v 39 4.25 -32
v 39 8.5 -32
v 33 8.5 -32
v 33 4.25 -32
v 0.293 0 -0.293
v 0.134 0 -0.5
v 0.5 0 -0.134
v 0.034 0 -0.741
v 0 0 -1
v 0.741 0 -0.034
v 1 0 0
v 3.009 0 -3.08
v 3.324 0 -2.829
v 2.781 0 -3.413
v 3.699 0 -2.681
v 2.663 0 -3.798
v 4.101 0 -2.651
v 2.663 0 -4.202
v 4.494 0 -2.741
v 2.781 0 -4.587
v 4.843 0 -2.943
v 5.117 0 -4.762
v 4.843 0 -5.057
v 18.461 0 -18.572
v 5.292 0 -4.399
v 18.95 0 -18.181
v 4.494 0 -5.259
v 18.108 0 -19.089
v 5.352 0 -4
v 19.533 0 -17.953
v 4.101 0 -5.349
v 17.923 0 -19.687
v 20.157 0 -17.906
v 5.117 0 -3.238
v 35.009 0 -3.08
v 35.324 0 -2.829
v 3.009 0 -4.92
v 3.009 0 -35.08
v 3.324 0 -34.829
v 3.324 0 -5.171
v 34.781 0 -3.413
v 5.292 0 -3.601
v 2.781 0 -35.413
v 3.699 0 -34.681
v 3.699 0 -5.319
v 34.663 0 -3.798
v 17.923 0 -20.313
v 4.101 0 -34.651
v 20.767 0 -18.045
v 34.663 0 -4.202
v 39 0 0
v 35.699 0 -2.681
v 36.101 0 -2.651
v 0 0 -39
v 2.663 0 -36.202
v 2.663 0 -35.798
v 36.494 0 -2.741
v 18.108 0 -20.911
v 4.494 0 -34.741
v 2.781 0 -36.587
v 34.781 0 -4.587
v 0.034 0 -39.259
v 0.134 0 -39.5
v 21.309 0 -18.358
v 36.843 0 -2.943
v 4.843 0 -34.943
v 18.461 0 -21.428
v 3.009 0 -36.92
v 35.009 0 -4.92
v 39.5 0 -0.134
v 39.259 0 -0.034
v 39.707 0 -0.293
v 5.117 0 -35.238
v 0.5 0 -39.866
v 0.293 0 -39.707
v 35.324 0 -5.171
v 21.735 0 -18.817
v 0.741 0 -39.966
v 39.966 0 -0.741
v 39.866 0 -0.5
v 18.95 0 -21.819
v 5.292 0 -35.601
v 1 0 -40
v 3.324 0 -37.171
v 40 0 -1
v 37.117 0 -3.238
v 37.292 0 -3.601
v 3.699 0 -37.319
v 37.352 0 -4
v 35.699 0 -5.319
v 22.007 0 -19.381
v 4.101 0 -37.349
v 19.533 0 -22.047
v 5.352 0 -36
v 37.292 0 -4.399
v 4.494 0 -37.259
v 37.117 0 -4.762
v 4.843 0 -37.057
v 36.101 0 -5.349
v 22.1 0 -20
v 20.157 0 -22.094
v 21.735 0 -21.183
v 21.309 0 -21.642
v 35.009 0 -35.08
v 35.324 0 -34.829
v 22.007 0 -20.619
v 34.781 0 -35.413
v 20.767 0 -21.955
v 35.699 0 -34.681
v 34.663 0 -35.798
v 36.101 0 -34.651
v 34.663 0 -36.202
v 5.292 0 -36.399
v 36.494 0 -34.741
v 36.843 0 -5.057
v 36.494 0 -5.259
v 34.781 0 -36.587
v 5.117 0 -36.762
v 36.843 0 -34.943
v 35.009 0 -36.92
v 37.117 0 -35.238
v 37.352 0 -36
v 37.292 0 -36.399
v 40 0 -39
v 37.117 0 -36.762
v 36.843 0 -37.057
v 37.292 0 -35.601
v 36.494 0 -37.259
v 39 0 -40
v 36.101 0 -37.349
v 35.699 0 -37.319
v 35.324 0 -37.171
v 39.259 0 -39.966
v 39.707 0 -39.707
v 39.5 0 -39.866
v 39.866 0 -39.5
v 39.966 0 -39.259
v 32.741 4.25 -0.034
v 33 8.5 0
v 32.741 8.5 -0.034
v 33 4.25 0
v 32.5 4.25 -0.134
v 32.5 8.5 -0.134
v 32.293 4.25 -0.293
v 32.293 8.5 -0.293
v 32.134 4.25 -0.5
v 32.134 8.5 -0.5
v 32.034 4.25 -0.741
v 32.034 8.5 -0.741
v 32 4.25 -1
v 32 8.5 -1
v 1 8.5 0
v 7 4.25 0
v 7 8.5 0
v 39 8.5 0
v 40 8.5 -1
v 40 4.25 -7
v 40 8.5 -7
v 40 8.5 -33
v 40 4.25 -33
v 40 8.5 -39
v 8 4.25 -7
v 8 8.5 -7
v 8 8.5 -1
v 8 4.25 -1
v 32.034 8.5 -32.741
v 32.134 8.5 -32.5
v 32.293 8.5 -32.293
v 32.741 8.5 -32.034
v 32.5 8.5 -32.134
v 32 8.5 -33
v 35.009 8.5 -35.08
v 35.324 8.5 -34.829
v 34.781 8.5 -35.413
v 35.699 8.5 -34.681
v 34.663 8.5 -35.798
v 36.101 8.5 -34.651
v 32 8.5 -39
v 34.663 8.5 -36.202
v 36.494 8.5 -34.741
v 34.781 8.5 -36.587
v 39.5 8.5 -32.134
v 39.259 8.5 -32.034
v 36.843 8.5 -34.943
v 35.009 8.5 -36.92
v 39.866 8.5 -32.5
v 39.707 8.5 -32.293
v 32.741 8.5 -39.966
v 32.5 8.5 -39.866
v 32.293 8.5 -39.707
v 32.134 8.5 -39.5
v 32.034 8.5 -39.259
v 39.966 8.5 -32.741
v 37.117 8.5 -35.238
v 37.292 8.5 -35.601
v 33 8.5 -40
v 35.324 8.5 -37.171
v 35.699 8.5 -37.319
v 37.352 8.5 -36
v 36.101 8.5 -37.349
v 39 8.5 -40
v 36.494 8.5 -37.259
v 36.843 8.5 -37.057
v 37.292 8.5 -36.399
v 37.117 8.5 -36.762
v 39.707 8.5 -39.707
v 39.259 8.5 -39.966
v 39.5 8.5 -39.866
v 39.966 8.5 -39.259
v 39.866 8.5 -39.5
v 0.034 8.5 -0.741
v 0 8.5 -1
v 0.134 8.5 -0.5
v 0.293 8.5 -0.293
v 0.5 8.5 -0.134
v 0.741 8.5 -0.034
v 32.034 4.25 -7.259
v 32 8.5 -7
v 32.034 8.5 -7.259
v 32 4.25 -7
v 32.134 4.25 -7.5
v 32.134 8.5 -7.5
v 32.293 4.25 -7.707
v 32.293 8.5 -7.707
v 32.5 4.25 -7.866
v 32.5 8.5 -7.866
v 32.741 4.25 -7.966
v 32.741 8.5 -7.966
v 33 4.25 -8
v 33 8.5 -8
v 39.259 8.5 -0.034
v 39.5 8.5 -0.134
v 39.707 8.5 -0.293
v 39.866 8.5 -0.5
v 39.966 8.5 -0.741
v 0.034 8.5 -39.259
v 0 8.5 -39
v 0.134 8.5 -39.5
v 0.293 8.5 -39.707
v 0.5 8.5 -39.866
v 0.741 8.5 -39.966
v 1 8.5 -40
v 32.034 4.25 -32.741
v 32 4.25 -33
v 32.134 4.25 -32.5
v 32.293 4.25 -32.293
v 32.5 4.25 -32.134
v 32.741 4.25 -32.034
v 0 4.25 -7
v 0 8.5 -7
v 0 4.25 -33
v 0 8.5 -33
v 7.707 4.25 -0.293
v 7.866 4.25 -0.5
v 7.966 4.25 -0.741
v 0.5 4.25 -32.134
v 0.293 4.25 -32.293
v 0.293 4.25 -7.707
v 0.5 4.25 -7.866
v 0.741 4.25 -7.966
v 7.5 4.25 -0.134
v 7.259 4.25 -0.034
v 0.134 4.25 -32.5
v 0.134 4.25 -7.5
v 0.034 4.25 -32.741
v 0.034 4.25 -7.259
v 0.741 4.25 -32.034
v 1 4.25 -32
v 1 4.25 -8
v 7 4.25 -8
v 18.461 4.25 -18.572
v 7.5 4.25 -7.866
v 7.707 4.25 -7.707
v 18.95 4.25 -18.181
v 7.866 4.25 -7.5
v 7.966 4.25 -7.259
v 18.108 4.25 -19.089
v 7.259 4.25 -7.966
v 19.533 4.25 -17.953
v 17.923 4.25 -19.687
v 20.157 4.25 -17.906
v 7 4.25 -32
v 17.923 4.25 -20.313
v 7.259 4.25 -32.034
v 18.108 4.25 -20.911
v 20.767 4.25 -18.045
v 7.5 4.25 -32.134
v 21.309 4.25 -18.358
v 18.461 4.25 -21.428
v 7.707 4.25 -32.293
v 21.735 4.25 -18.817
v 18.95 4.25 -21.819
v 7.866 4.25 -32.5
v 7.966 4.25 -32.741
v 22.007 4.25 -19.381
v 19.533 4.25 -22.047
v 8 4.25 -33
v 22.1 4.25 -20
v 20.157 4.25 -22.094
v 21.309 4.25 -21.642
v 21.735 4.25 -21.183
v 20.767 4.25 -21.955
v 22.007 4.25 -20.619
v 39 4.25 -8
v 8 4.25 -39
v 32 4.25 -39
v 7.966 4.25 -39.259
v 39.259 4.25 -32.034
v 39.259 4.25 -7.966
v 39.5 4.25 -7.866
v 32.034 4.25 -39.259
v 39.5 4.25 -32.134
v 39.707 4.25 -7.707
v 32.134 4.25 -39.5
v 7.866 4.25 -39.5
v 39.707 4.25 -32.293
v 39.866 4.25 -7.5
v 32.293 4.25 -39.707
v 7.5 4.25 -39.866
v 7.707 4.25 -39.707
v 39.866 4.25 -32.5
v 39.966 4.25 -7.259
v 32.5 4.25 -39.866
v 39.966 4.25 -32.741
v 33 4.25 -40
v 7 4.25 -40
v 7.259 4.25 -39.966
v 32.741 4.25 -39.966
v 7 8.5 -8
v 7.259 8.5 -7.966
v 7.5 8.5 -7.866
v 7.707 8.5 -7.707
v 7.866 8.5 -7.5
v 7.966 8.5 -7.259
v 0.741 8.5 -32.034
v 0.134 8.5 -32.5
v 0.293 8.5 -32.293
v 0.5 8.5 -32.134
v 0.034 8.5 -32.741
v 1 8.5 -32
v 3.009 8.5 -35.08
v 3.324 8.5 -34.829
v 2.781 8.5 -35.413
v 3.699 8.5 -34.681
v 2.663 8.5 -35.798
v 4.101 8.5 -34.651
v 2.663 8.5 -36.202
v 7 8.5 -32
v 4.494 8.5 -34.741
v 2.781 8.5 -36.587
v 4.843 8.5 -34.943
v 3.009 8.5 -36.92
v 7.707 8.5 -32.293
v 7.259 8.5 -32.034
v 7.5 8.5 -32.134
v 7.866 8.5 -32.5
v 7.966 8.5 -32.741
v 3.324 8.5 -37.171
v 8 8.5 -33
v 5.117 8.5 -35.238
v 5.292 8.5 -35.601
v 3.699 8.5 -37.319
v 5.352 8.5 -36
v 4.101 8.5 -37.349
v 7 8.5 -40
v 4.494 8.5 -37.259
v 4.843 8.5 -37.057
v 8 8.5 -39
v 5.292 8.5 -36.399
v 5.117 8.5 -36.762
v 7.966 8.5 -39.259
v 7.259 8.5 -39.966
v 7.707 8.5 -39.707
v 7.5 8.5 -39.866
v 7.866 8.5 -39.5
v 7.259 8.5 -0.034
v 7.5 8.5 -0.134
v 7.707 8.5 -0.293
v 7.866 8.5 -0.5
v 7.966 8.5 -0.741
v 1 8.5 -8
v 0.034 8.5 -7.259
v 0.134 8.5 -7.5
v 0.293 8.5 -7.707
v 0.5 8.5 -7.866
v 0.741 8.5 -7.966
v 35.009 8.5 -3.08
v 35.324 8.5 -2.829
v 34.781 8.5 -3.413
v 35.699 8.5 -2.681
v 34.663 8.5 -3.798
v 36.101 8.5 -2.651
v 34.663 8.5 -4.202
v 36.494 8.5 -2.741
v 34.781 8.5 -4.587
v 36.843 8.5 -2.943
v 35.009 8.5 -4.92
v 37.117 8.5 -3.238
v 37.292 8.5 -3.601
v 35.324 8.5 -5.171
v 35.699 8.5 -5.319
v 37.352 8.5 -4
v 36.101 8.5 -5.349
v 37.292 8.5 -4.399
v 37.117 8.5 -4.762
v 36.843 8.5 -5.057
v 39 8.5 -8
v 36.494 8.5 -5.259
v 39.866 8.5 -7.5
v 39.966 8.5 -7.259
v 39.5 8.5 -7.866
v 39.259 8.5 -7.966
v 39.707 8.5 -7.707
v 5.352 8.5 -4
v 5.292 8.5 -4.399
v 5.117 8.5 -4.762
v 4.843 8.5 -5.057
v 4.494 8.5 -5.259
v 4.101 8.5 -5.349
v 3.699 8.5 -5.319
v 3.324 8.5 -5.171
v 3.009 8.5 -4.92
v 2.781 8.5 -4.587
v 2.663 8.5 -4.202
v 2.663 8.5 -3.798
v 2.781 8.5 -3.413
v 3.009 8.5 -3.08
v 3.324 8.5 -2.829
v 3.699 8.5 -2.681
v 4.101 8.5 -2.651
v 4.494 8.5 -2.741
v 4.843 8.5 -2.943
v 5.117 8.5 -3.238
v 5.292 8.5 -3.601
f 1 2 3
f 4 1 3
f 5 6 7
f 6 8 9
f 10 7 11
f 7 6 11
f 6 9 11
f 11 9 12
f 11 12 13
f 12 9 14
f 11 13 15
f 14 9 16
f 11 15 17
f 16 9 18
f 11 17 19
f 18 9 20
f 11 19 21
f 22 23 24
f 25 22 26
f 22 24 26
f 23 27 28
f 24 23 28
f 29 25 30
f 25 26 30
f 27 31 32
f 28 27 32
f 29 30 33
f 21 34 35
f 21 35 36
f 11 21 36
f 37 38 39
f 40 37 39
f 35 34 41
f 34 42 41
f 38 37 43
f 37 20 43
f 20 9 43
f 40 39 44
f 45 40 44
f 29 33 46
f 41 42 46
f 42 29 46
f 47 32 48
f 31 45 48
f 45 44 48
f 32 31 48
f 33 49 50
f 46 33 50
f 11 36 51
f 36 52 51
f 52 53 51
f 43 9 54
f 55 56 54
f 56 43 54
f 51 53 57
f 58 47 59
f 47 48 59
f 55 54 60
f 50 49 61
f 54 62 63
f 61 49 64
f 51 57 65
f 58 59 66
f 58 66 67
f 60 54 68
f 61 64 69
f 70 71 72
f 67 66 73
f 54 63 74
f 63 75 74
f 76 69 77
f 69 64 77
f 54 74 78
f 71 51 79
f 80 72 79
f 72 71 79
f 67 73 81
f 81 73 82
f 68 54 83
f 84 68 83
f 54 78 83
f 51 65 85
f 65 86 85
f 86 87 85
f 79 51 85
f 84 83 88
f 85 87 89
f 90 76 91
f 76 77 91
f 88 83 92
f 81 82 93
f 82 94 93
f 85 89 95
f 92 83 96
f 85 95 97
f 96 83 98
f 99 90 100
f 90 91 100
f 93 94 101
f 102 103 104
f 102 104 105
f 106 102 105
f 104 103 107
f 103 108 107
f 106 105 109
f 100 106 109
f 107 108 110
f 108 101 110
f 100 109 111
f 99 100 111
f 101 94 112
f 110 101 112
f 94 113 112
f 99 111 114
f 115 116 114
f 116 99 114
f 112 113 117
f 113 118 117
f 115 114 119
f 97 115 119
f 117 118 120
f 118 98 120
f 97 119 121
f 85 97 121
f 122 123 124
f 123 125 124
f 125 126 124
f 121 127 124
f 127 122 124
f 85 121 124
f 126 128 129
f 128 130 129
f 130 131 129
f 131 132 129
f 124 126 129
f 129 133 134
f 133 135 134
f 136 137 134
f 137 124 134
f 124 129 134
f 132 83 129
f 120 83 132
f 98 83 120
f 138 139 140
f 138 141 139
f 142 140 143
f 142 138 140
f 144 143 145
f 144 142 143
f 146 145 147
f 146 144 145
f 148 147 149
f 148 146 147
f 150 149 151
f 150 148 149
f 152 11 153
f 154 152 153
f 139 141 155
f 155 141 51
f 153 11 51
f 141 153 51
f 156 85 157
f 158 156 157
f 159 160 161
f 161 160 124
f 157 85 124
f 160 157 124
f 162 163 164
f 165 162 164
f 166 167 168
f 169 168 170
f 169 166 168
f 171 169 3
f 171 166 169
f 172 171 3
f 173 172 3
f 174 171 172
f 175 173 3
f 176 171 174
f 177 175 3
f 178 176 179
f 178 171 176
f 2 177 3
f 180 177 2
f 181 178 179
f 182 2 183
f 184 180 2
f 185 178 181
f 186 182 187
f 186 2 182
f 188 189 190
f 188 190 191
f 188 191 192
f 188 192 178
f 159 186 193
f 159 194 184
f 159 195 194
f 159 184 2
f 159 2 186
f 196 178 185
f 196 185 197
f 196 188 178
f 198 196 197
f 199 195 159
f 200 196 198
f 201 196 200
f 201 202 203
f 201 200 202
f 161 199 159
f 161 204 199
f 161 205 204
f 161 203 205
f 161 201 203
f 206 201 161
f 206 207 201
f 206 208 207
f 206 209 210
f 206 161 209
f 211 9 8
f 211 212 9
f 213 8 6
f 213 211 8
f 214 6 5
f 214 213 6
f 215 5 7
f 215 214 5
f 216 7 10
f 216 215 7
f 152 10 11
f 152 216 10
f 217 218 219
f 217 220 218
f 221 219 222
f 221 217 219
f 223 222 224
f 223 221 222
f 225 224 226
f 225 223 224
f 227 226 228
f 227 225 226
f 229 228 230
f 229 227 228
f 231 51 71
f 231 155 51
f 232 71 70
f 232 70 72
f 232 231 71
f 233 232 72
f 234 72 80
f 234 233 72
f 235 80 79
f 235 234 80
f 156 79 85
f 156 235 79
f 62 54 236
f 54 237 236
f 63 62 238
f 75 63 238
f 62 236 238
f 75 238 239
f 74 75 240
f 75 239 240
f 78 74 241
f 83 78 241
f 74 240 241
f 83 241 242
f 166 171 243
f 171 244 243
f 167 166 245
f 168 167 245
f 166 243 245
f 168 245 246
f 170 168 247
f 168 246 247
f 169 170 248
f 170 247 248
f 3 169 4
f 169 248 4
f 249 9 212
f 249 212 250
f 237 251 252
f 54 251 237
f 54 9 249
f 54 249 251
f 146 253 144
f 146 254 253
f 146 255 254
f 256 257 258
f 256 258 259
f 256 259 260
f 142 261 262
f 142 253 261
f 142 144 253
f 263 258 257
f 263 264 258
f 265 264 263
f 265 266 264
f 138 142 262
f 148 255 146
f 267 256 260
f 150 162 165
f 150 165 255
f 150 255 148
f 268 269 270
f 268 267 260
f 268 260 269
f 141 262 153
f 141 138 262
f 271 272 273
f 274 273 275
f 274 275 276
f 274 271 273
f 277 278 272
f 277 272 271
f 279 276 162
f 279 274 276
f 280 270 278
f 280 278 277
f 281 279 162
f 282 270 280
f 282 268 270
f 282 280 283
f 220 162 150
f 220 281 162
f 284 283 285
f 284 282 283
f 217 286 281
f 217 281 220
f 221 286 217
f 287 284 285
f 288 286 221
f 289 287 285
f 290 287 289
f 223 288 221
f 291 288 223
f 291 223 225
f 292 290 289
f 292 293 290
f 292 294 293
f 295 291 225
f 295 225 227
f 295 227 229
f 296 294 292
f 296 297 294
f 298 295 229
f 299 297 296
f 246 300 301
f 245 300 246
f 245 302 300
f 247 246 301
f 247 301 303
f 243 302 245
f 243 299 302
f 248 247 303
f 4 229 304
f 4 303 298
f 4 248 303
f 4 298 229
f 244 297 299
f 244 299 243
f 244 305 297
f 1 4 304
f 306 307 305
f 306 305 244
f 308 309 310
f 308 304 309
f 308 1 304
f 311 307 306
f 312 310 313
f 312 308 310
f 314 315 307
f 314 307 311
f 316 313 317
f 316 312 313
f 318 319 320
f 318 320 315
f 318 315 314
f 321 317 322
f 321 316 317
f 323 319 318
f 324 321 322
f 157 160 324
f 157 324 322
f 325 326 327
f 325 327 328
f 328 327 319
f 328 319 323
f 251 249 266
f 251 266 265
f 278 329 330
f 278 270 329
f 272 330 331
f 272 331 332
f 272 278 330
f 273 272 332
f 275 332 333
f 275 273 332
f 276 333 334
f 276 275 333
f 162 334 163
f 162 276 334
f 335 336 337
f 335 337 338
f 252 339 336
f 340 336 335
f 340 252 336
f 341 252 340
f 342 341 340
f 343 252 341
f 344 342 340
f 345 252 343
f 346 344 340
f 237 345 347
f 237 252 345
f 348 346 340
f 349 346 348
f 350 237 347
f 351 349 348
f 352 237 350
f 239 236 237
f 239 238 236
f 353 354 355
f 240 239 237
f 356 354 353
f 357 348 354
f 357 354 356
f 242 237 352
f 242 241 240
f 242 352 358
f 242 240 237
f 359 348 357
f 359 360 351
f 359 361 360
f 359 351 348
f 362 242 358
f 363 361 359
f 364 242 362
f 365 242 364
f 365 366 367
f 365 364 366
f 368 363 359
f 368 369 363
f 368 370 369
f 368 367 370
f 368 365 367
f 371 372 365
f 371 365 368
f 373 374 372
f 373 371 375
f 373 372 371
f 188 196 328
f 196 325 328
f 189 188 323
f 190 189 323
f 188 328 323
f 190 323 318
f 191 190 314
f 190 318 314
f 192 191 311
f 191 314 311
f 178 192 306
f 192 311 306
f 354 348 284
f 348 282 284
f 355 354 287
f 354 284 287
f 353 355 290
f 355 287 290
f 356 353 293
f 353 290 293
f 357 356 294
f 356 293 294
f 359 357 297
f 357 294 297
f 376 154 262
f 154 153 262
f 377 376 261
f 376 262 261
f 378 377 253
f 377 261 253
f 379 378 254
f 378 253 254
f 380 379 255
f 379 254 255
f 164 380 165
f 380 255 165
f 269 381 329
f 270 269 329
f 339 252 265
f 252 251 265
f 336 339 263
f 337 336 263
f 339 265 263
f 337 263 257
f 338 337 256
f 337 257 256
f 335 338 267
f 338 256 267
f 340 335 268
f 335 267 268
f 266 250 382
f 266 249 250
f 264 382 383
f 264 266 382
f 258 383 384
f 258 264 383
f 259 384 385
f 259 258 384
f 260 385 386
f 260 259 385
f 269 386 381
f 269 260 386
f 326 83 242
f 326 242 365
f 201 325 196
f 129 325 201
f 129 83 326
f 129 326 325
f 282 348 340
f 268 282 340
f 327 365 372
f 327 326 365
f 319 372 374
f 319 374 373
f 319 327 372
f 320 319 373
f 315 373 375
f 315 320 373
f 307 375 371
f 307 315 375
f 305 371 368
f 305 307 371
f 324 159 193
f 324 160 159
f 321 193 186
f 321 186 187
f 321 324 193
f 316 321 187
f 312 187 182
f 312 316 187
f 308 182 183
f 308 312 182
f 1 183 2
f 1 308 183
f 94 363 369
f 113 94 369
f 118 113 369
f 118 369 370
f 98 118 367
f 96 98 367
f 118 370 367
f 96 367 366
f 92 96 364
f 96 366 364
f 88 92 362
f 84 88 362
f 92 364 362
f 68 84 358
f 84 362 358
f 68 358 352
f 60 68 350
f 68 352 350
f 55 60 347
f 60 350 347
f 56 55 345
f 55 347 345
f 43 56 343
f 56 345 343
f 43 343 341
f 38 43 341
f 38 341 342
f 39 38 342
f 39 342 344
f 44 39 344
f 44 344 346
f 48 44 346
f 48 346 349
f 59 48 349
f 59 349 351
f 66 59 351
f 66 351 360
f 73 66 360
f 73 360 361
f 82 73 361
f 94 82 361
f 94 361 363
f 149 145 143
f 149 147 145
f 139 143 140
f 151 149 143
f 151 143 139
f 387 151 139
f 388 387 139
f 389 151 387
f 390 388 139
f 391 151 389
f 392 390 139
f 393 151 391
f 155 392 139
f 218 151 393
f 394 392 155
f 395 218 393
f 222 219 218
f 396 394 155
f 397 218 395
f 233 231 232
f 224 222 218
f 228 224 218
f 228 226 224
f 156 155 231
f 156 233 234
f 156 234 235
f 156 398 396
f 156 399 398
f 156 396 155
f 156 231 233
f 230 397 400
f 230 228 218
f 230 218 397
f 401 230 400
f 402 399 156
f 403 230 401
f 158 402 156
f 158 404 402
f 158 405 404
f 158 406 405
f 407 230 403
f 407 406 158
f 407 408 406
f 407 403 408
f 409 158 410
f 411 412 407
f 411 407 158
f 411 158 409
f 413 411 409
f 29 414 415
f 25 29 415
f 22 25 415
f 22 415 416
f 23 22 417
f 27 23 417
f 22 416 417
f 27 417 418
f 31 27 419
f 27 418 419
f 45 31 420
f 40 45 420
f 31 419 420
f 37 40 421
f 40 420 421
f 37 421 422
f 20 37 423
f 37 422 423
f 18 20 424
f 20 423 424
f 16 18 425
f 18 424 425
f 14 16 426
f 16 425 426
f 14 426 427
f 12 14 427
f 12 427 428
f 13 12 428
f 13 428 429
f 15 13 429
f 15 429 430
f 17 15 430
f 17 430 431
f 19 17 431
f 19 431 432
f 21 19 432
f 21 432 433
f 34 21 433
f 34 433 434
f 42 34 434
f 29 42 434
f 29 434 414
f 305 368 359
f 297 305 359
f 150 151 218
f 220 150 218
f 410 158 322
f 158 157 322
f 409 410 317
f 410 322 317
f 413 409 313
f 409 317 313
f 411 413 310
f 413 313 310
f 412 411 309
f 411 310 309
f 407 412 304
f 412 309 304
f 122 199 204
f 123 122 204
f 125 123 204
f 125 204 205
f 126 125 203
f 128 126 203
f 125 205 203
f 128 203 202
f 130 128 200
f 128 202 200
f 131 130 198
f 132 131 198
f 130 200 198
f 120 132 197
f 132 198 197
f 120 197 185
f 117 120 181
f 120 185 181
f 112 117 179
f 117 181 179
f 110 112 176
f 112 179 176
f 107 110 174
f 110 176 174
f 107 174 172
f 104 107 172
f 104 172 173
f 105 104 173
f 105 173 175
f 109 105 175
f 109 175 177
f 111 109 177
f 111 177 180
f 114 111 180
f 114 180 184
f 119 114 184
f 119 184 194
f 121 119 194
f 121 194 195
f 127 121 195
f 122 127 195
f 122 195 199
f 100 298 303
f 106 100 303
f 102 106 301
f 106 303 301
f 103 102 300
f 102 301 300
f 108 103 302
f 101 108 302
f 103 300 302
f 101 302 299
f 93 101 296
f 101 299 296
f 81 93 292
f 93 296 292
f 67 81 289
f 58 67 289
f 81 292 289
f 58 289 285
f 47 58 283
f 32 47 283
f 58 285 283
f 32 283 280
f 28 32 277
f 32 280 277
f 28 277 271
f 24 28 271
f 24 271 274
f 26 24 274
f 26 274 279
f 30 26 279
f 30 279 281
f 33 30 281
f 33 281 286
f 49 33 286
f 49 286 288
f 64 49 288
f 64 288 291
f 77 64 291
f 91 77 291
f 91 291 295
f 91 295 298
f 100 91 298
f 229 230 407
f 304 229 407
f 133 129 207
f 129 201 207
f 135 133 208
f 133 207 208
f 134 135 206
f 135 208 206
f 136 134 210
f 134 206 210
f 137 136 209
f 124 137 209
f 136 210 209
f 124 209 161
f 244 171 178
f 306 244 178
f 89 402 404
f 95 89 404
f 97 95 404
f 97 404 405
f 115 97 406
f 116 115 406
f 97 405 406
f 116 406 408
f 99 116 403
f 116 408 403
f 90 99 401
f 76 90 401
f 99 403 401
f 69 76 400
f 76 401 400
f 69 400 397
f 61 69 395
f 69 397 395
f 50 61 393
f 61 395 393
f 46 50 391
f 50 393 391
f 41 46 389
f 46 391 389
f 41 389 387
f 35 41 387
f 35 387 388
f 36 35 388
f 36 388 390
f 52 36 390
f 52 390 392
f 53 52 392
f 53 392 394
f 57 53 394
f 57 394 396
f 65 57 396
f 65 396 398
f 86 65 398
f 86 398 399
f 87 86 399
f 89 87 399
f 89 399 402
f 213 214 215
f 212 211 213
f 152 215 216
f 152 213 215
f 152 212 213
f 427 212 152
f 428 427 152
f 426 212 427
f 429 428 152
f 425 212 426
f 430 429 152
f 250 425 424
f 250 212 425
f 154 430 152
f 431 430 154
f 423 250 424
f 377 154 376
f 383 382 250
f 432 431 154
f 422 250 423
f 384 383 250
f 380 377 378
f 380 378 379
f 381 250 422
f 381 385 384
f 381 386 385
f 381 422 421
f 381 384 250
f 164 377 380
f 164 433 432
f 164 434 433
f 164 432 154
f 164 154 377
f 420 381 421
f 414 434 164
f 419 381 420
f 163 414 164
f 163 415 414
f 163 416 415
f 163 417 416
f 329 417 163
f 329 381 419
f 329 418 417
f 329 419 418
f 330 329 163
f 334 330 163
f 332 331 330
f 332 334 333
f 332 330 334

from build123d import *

# Parameters (mm, degrees)
SKETCH1_W           = 40
SKETCH1_H           = 40
BOSS_EXTRUDE1_DEPTH = 8.5
SKETCH2_R           = 1.3525
SKETCH2_R_2         = 2.1
CUT_EXTRUDE1_DEPTH  = 9.5
SKETCH3_R           = 3.5
CUT_EXTRUDE2_DEPTH  = 4.25
CUT_EXTRUDE3_DEPTH  = 4.25
FILLET1_R           = 1


with BuildPart() as part:
    # Sketch1 → Boss-Extrude1 (new body)
    with BuildSketch(Plane(origin=(0, 0, 0), x_dir=(1, 0, 0), z_dir=(0, 1, 0))):
        with Locations((20, 20)):
            Rectangle(SKETCH1_W, SKETCH1_H)
    extrude(amount=BOSS_EXTRUDE1_DEPTH)

    # Sketch2 → Cut-Extrude1 (cut, through all)
    with BuildSketch(Plane(origin=(0, 8.5, 0), x_dir=(1, 0, 0), z_dir=(0, 1, 0))):
        with Locations((4, 4)):
            Circle(SKETCH2_R)
        with Locations((36, 4)):
            Circle(SKETCH2_R)
        with Locations((36, 36)):
            Circle(SKETCH2_R)
        with Locations((4, 36)):
            Circle(SKETCH2_R)
        with Locations((20, 20)):
            Circle(SKETCH2_R_2)
    extrude(amount=-CUT_EXTRUDE1_DEPTH, mode=Mode.SUBTRACT)

    # Sketch3 → Cut-Extrude2 (cut)
    with BuildSketch(Plane(origin=(0, 8.5, 0), x_dir=(1, 0, 0), z_dir=(0, 1, 0))):
        with Locations((20, 20)):
            Circle(SKETCH3_R)
    extrude(amount=-CUT_EXTRUDE2_DEPTH, mode=Mode.SUBTRACT)

    # Sketch4 → Cut-Extrude3 (cut)
    with BuildSketch(Plane(origin=(0, 8.5, 0), x_dir=(1, 0, 0), z_dir=(0, 1, 0))):
        Polygon((0, 8), (8, 8), (8, 0), (32, 0), (32, 8), (40, 8), (40, 32), (32, 32), (32, 40), (8, 40), (8, 32), (0, 32), align=None)
    extrude(amount=-CUT_EXTRUDE3_DEPTH, mode=Mode.SUBTRACT)

    # Fillet1
    fillet1_edges = [part.edges().sort_by_distance(p)[0] for p in [
        (0, 4.25, -40),
        (40, 4.25, -40),
        (40, 4.25, 0),
        (0, 4.25, 0),
        (0, 6.375, -8),
        (0, 6.375, -32),
        (8, 6.375, -32),
        (8, 6.375, -40),
        (32, 6.375, -40),
        (32, 6.375, -32),
        (40, 6.375, -32),
        (40, 6.375, -8),
        (32, 6.375, -8),
        (32, 6.375, 0),
        (8, 6.375, 0),
        (8, 6.375, -8),
    ]]
    fillet(fillet1_edges, radius=FILLET1_R)


solid = part.part
